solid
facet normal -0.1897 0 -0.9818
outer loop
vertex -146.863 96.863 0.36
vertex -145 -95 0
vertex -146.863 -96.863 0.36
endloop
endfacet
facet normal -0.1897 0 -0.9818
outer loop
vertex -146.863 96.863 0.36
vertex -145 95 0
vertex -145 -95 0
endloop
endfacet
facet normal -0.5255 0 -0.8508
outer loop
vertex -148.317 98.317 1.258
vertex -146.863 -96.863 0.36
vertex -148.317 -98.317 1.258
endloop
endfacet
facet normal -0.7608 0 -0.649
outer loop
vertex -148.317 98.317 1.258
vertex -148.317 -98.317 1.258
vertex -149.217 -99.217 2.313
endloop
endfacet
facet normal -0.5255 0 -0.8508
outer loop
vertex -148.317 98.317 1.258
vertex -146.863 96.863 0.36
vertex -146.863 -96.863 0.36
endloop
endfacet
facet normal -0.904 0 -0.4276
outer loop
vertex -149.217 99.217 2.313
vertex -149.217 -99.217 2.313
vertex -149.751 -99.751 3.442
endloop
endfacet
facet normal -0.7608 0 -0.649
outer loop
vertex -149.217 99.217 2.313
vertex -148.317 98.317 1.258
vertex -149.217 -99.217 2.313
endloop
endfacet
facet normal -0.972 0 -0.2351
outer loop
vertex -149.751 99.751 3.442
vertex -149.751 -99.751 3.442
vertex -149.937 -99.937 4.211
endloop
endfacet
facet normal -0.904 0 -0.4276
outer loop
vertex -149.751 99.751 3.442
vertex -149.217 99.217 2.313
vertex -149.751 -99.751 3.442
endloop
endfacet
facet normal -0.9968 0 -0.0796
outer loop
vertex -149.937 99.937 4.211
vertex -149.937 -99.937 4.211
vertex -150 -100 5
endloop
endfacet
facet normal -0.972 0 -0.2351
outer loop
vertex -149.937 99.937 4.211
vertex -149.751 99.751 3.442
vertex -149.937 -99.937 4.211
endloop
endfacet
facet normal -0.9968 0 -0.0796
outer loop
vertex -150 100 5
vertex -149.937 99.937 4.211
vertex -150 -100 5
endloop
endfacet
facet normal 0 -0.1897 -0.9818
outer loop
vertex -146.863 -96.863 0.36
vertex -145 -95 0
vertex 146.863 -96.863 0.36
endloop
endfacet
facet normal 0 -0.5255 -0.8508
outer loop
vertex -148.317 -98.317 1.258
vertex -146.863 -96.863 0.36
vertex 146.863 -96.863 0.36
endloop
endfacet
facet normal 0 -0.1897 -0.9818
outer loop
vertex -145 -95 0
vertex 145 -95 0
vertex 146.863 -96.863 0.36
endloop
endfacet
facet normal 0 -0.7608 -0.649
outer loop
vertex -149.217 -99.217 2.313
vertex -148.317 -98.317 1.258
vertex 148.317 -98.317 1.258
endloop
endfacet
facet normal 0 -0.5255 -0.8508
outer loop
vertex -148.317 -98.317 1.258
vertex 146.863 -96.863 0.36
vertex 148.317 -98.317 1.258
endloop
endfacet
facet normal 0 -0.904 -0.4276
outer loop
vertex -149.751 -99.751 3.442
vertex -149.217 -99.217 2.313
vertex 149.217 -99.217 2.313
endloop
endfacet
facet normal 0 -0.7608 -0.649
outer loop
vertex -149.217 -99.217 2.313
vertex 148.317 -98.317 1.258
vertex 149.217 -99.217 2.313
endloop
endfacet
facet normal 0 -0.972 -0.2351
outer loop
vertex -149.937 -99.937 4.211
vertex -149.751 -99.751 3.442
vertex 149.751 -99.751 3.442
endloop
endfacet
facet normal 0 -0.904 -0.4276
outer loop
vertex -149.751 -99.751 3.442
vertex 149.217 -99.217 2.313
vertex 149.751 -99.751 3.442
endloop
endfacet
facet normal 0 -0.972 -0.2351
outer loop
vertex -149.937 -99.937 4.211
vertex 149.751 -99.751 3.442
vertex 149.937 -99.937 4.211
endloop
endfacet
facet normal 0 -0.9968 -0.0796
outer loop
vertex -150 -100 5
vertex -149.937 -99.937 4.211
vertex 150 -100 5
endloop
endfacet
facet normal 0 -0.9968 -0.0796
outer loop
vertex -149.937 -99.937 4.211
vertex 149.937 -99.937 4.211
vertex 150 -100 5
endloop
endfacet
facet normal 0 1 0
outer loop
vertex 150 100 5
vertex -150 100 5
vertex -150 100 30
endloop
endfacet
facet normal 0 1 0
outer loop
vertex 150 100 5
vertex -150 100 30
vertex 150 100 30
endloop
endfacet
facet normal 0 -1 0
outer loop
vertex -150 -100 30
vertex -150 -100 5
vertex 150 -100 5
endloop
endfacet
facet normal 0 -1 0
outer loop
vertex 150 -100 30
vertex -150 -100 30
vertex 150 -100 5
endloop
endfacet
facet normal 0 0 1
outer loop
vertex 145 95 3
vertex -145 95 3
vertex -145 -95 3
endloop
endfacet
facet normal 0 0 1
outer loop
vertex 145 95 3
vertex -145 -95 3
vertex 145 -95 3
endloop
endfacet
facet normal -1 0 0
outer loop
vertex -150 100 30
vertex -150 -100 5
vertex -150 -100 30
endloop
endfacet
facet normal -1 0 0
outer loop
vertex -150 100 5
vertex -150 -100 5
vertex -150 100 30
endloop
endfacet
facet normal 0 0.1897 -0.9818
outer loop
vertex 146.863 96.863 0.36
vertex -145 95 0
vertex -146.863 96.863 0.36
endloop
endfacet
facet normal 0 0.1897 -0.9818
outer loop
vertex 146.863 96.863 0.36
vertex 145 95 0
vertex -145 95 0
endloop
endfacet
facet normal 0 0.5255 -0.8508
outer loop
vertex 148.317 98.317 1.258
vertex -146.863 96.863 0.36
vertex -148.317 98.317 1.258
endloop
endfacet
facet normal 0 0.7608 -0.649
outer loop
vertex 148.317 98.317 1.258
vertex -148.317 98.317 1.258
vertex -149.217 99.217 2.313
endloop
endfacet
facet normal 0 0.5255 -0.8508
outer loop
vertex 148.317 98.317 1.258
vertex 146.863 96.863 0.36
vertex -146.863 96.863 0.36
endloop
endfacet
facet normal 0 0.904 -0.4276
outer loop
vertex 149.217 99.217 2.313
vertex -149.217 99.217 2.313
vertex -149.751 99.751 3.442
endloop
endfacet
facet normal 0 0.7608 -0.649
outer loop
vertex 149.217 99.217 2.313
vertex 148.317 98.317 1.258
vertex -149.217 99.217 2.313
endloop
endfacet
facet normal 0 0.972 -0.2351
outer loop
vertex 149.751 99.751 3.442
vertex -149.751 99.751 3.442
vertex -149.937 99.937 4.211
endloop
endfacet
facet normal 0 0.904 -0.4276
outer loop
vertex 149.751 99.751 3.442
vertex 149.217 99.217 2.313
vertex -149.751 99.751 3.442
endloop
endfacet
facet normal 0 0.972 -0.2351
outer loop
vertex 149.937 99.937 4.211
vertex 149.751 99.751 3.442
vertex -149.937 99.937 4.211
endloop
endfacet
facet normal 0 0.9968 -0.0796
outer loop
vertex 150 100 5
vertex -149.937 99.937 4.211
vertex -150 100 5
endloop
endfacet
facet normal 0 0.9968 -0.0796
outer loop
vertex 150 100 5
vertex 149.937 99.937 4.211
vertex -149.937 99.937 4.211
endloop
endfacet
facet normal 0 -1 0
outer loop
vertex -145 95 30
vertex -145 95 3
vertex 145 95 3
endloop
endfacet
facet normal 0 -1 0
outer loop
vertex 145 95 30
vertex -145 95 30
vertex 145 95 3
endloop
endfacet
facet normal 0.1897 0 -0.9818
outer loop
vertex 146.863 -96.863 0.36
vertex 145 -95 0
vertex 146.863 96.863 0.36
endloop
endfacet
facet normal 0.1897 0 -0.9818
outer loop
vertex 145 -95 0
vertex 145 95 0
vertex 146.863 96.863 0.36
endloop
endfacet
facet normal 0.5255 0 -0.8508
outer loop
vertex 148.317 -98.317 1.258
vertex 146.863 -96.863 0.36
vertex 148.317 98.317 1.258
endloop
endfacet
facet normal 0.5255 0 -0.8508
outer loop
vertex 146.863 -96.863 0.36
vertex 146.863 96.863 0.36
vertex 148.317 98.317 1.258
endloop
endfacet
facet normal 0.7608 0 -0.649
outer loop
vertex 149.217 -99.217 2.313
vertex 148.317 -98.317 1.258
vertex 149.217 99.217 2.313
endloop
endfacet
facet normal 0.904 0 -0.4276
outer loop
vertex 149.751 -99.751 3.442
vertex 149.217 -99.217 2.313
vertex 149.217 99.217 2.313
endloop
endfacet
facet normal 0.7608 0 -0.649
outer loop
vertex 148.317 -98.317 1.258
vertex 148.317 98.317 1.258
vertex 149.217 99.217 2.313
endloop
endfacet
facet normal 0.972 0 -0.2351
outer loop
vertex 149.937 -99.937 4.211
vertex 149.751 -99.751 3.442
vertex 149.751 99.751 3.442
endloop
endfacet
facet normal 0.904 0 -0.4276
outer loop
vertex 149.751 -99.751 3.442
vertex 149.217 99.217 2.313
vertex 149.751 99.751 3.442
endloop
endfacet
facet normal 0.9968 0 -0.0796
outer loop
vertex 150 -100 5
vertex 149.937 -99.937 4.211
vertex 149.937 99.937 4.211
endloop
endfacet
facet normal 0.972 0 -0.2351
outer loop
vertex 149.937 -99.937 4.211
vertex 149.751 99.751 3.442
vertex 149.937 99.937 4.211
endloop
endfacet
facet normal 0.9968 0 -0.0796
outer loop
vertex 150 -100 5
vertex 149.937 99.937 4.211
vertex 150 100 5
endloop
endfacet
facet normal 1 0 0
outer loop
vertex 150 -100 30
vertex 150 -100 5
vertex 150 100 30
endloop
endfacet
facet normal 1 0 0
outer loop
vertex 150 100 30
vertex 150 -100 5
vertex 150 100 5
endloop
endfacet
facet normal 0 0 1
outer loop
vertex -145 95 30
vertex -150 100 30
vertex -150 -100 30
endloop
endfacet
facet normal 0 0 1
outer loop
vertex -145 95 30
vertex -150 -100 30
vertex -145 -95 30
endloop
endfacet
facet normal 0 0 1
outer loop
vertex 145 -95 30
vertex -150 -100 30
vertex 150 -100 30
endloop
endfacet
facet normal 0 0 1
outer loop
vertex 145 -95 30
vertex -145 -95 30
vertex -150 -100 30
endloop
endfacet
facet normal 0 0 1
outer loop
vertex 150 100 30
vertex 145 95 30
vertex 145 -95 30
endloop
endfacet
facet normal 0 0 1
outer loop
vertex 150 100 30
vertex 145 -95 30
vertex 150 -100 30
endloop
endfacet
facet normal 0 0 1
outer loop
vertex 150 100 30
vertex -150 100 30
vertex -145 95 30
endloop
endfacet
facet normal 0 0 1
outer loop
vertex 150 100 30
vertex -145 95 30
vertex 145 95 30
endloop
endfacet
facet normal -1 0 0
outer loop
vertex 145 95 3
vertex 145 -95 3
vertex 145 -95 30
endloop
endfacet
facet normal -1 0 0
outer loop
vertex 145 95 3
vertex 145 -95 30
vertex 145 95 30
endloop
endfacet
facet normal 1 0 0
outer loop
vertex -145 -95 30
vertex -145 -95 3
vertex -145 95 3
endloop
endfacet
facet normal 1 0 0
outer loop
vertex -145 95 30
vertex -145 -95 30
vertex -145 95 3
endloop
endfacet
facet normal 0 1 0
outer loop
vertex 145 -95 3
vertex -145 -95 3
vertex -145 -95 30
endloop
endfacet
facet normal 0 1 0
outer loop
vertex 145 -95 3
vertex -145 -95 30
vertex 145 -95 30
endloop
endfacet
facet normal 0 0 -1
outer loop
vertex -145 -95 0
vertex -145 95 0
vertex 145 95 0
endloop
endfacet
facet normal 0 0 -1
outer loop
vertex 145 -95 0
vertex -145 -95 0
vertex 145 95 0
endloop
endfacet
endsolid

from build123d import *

# Parameters (mm, degrees)
F0_W     = 300
F0_H     = 200
F0_W_2   = 295
F0_H_2   = 195
F0_W_3   = 290
F0_H_3   = 190
F1_DEPTH = 30
F2_DEPTH = 3
F3_DEPTH = 3
F4_R     = 5


with BuildPart() as f1:
    # F0 (on Top) → F1 (new body)
    with BuildSketch(Plane.XY):
        Rectangle(F0_W, F0_H)
        Rectangle(F0_W_2, F0_H_2, mode=Mode.SUBTRACT)
        Rectangle(F0_W_2, F0_H_2)
        Rectangle(F0_W_3, F0_H_3, mode=Mode.SUBTRACT)
    extrude(amount=F1_DEPTH)

    # F0 (on Top) → F2 (cut)
    with BuildSketch(Plane.XY):
        Rectangle(F0_W_2, F0_H_2)
        Rectangle(F0_W_3, F0_H_3, mode=Mode.SUBTRACT)
    extrude(amount=F2_DEPTH, mode=Mode.SUBTRACT)

    # F0 (on Top) → F3 (join)
    with BuildSketch(Plane.XY):
        Rectangle(F0_W_2, F0_H_2)
        Rectangle(F0_W_3, F0_H_3, mode=Mode.SUBTRACT)
        Rectangle(F0_W_3, F0_H_3)
    extrude(amount=F3_DEPTH)

    # F4
    f4_edges = [f1.edges().sort_by_distance(p)[0] for p in [
        (150, 0, 0),
        (0, 100, 0),
        (-150, 0, 0),
        (0, -100, 0),
    ]]
    fillet(f4_edges, radius=F4_R)


solid = f1.part
